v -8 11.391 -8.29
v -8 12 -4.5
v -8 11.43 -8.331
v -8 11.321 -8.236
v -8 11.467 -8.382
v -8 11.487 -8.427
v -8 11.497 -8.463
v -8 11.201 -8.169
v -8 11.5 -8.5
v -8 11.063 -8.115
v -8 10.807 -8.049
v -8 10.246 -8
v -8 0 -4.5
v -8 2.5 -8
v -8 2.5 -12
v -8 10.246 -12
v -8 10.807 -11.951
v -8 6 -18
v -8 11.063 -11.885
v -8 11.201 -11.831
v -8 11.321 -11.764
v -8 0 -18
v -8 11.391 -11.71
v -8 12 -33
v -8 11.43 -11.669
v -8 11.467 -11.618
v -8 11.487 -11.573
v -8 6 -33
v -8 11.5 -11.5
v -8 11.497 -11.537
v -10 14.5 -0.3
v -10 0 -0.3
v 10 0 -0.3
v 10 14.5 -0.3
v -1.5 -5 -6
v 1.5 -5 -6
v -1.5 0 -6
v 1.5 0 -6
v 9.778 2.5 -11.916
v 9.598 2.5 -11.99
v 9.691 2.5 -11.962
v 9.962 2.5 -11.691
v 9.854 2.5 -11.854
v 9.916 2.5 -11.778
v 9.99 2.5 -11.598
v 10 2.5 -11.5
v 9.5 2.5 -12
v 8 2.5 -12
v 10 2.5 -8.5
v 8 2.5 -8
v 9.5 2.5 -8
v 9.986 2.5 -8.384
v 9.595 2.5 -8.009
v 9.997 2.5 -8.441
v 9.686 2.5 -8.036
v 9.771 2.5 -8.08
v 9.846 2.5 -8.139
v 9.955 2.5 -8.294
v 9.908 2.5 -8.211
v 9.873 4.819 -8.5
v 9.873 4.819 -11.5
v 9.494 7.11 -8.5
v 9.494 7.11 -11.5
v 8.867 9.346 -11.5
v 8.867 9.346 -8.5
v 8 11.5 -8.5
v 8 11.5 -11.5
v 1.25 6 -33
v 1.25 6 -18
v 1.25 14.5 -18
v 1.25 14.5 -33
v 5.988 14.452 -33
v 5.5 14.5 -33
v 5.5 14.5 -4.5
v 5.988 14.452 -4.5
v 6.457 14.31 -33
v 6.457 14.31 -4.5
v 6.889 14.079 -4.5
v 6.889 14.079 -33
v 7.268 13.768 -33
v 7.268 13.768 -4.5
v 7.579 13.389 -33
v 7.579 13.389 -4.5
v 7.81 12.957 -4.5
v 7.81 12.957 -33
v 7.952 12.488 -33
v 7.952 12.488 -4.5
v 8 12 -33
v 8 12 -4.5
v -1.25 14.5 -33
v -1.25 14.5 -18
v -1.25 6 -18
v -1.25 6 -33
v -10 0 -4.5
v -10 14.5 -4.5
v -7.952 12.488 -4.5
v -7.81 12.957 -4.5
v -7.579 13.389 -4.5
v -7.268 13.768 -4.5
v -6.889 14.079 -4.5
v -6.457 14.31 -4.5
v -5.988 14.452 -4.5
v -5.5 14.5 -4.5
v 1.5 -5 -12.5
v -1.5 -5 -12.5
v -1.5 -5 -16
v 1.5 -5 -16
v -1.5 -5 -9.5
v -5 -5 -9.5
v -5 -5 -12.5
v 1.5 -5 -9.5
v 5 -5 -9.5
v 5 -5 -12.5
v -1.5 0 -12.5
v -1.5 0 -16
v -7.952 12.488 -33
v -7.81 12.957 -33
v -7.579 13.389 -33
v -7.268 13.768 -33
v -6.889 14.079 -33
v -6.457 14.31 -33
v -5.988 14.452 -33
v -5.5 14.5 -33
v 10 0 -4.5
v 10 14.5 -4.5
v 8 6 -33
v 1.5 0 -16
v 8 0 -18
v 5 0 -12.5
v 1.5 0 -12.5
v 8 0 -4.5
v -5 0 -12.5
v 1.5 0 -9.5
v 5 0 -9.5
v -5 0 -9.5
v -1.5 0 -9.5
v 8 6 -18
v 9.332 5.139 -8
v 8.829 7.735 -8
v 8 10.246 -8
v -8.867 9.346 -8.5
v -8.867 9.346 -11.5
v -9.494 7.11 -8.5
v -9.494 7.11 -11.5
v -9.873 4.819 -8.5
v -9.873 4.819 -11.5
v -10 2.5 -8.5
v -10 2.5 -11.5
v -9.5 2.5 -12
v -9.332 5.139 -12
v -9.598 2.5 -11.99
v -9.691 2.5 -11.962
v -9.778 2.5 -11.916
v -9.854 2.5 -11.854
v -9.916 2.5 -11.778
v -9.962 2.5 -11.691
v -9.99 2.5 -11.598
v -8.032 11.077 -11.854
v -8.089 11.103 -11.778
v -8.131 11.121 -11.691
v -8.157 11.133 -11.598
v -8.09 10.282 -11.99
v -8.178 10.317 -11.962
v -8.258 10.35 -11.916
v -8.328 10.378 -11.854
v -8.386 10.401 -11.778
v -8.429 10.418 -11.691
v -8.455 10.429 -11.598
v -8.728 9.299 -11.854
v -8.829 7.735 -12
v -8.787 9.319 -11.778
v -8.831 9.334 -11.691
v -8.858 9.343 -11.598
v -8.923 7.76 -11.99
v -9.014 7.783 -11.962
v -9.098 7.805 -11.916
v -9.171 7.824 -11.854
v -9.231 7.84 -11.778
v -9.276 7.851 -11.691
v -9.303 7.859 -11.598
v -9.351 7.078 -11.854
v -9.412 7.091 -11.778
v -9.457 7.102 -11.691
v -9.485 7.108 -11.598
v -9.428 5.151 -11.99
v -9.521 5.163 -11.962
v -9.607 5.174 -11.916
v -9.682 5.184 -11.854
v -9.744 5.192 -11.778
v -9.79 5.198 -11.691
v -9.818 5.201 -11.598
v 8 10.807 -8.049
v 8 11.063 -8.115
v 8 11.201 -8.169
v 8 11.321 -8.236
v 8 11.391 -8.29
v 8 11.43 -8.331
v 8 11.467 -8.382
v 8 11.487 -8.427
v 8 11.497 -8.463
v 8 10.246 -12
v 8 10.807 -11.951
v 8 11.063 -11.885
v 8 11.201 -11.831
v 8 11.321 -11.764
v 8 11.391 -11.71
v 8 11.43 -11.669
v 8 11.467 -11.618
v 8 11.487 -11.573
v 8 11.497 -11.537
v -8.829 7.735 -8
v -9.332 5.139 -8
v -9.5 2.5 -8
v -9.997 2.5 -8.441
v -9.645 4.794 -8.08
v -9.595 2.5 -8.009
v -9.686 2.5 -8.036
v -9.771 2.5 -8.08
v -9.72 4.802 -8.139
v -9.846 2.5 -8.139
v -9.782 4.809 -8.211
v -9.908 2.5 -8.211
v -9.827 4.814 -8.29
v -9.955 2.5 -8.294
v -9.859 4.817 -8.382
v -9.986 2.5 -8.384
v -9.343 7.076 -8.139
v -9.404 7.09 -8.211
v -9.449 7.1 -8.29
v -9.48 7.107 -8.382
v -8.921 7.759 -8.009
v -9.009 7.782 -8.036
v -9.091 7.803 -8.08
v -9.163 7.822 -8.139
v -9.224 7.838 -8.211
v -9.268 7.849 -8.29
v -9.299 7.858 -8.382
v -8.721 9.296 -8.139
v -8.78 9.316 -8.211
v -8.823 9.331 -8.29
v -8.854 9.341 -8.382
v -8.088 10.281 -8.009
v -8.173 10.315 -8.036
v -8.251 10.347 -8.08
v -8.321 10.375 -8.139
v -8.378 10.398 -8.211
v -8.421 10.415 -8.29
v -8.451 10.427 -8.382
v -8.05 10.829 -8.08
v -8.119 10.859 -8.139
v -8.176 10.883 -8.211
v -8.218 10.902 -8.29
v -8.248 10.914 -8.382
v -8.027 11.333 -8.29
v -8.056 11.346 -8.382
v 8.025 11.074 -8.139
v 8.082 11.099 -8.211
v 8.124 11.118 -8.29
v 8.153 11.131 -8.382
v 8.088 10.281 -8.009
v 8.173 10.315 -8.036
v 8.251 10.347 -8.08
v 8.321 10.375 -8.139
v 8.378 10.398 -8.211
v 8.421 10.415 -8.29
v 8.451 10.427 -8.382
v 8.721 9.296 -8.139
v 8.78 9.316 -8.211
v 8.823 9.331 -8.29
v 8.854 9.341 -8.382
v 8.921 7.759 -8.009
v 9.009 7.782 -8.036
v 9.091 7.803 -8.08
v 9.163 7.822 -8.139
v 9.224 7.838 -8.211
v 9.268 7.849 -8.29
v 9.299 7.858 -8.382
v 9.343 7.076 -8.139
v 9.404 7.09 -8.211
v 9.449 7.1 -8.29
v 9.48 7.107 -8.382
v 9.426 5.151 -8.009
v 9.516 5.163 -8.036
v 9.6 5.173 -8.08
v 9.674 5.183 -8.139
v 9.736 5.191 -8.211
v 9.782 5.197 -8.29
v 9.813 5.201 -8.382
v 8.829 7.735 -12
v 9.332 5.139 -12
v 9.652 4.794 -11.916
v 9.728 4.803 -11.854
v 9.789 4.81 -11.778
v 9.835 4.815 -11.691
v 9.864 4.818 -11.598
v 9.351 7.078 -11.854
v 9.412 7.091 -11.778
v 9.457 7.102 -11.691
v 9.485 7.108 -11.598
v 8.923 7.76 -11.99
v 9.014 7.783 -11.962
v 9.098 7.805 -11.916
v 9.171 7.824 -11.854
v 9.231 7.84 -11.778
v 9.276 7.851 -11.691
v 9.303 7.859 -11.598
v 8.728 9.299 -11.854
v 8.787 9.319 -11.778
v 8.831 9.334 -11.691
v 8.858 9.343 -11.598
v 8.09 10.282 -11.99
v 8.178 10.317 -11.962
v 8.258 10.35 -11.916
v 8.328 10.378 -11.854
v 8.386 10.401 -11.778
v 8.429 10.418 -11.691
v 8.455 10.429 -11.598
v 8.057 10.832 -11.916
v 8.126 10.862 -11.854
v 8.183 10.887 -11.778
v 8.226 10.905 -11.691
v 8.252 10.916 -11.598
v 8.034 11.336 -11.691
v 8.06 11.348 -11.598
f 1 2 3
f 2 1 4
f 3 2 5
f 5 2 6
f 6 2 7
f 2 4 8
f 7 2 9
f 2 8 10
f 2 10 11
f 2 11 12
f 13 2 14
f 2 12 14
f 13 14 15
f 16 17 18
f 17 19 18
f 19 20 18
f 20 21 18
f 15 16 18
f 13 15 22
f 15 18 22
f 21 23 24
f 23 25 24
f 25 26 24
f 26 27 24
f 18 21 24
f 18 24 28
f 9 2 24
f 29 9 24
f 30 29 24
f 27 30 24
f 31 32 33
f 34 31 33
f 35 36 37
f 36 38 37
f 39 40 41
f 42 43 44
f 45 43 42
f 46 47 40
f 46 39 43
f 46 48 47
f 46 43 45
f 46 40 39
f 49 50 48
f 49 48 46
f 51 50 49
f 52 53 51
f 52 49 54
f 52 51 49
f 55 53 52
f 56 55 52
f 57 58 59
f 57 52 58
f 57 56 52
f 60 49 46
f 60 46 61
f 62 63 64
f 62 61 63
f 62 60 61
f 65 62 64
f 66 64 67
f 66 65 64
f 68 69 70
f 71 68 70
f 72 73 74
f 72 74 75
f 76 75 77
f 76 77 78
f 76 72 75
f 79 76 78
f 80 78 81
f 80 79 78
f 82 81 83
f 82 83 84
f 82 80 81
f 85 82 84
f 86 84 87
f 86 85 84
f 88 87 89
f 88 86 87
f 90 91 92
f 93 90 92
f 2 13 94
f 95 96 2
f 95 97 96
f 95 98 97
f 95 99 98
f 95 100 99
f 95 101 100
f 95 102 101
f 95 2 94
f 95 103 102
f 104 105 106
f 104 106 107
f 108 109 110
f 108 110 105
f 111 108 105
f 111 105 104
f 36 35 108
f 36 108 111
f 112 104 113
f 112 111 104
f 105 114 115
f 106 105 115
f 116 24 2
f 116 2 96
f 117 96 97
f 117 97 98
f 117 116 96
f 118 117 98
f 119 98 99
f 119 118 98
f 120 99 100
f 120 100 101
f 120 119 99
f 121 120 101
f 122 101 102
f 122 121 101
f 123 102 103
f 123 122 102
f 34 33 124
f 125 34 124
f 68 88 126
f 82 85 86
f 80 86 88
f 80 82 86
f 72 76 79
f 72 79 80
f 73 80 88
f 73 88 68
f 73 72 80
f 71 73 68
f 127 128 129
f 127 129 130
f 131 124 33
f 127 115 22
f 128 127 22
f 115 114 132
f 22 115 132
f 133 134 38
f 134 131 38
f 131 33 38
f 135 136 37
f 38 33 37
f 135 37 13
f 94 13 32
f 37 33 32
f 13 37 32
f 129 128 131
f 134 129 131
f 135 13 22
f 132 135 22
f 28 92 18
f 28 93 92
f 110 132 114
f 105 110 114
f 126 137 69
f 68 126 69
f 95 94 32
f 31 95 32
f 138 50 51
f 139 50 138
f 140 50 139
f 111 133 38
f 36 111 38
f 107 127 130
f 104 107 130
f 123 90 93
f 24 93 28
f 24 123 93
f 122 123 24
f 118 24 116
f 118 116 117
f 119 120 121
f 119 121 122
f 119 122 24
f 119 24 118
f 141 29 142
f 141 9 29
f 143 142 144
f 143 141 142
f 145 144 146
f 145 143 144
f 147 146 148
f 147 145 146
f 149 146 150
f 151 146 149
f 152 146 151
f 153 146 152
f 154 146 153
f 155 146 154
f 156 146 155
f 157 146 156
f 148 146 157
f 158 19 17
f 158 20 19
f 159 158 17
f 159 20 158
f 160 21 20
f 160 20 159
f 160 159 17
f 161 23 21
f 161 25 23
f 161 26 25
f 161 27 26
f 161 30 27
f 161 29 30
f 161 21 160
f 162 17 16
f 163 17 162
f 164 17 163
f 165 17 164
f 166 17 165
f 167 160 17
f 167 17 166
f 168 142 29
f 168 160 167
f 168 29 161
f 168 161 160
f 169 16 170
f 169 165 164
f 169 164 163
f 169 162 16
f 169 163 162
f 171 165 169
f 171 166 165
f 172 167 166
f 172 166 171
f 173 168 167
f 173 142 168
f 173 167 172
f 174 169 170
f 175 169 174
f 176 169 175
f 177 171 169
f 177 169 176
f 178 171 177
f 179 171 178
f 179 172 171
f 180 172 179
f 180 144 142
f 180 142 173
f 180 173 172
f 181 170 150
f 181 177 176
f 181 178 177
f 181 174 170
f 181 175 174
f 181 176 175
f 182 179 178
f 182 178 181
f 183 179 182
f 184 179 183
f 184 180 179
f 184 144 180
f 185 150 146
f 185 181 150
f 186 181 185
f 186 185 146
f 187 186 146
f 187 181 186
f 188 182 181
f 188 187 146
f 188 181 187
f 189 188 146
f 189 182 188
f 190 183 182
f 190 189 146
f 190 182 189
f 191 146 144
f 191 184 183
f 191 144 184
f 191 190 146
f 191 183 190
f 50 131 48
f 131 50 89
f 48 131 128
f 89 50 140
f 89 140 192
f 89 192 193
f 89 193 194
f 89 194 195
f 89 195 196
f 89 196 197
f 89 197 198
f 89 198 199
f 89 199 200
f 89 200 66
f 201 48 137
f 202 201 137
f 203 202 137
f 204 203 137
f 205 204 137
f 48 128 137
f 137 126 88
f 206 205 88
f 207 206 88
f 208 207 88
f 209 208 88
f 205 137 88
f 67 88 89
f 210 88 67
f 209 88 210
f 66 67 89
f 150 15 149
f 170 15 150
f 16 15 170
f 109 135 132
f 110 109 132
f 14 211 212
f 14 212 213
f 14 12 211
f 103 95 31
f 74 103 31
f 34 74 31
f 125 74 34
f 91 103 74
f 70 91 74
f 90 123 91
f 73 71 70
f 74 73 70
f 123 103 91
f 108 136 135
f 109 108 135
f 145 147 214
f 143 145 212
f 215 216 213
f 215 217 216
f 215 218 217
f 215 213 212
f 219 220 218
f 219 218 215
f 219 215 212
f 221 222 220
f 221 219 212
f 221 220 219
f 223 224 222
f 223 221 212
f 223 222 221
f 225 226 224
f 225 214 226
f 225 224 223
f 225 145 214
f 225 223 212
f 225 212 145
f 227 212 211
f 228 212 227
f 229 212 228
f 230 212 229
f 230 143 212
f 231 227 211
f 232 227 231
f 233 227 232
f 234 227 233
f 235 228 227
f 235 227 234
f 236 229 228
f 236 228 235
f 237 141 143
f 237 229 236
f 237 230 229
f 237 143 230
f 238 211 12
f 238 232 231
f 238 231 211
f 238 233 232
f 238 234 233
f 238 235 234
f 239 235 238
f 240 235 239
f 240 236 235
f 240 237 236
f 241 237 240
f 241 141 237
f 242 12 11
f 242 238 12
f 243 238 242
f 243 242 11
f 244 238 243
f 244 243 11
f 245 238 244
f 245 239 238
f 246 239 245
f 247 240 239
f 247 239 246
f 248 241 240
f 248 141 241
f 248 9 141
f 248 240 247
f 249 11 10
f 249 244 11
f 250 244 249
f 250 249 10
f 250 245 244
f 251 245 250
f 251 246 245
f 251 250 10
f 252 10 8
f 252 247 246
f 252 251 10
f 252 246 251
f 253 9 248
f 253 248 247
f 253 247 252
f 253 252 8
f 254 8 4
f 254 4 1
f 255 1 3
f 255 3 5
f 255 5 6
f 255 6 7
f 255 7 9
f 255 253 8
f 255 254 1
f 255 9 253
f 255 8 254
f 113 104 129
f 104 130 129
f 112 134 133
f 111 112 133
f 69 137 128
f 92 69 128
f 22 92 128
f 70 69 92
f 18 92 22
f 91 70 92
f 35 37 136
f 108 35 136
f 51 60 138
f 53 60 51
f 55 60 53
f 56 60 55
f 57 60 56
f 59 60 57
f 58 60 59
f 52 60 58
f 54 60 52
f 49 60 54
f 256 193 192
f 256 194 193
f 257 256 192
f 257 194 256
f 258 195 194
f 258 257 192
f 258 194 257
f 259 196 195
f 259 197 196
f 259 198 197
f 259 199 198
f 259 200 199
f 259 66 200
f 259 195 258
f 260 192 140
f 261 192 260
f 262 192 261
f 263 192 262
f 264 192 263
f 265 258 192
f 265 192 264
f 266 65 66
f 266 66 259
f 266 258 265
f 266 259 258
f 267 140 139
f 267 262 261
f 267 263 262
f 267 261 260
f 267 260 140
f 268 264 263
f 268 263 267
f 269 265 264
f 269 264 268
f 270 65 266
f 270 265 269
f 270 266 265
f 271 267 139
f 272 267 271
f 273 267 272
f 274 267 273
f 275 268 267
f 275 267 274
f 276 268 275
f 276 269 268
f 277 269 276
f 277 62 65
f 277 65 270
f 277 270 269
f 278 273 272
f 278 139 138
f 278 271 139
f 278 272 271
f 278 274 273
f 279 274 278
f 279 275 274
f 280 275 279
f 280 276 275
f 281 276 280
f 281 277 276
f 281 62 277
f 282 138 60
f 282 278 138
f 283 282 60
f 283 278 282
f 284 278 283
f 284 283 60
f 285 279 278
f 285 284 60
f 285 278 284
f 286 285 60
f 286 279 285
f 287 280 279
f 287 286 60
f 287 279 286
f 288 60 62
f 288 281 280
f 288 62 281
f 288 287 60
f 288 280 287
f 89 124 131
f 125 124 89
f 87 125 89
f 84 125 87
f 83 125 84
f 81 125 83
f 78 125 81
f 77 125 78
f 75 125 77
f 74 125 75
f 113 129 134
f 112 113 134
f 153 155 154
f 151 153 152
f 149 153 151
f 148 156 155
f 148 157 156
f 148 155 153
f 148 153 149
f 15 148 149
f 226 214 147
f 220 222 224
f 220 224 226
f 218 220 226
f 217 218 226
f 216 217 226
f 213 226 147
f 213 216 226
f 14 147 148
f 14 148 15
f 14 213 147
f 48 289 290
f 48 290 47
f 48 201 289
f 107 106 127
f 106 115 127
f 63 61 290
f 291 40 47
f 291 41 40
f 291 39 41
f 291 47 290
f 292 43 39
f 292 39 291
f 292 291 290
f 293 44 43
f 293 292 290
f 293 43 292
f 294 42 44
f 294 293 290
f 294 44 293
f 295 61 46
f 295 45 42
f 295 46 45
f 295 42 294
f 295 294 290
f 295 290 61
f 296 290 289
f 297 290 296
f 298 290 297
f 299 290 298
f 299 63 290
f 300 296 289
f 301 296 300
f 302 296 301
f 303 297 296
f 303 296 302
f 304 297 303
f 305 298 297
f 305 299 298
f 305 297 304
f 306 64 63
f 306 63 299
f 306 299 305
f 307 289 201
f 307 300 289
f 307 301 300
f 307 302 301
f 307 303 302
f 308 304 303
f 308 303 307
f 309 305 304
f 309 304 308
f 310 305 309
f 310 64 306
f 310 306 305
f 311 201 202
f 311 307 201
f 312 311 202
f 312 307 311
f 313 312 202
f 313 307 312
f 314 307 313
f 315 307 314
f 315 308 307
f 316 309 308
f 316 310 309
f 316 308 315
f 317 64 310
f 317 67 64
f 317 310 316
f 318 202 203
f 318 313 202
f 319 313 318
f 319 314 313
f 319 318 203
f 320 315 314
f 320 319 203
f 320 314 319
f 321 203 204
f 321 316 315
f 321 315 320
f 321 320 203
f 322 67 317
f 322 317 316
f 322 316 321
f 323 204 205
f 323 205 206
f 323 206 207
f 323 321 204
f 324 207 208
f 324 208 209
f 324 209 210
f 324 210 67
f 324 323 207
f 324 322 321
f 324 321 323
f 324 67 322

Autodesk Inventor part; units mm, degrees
ref_plane "YZ Plane" through (0, 0, 0) normal (1, 0, 0) x (0, 1, 0)
ref_plane "XZ Plane" through (0, 0, 0) normal (0, 1, 0) x (-1, 0, 0)
ref_plane "XY Plane" through (0, 0, 0) normal (0, 0, 1) x (1, 0, 0)
sketch "スケッチ1" plane through (0, 0, 0) normal (0, 1, 0) x (-1, 0, 0)
  line L0 (10, -0.3) -> (0, -0.3)
  line L1 (0, -0.3) -> (0, -5)
  line L2 (0, -5) -> (10, -5)
  line L3 (10, -5) -> (10, -0.3)
  line L4 (8.5, -5) -> (0, -5)
  line L5 (0, -5) -> (0, -18)
  line L6 (0, -18) -> (8.5, -18)
  line L7 (8.5, -18) -> (8.5, -5)
  line L8 (10, -18) -> (0, -18)
  line L9 (0, -18) -> (0, -22.7)
  line L10 (0, -22.7) -> (10, -22.7)
  line L11 (10, -22.7) -> (10, -18)
  point P0 (0, 0)
  dimension "d0" = 10
  dimension "d2" = 1.5
  dimension "d3" = 13
  dimension "d34" = 5
  dimension "d35" = 0.3
extrude "押し出し1" add sketch "スケッチ1" along normal blind 15
sketch "スケッチ3" plane through (-10, 0, -18) normal (0, 0, 1) x (1, 0, 0)
  line L0 (0, 0) -> (1.5, 0) projected
  line L1 (1.5, 0) -> (1.5, 15) projected
  line L2 (0, 15) -> (1.5, 15) projected
  line L3 (0, 0) -> (0, 15) projected
  line L4 (0, 0) -> (10, 0) projected
  line L5 (10, 0) -> (10, 15) projected
  line L6 (0, 15) -> (10, 15) projected
  line L7 (0, 0) -> (0, 15) projected
  circle A0 centre (4.5, 12) radius 3
  circle A1 centre (4.5, 12) radius 2.5
  line L8 (2, 12) -> (2, 0)
  line L9 (4.5, 14.5) -> (10, 14.5)
  point P0 (1.5, 15)
  point P1 (1.5, 0)
  dimension "d6" = 6
  dimension "d7" = 0.5
extrude "押し出し2" cut sketch "スケッチ3" along normal up to surface (13 mm away) contours L1 A0 L8 L4 | L1 L6 A0 | A0 L9 A1 L8 | L6 L5 L9 A0 picked at (5.4334, 14.5914)
sketch "スケッチ4" plane through (0, 15, 0) normal (0, 1, 0) x (1, 0, 0)
  line L0 (0, 5) -> (-10, 5) projected
  line L1 (-10, 5) -> (-10, 0.3) projected
  line L2 (-10, 0.3) -> (0, 0.3) projected
  line L3 (0, 0.3) -> (0, 5) projected
  point P0 (0, 0)
extrude "押し出し3" cut sketch "スケッチ4" against normal up to surface (0.5 mm away)
sketch "スケッチ5" plane through (-8, 0, -18) normal (-1, 0, 0) x (0, 0, 1)
  line L0 (13, 0) -> (18, 0) projected
  line L1 (13, 0) -> (3, 0)
  line L2 (3, 0) -> (3, 15)
  line L3 (3, 15) -> (13, 15)
  line L4 (13, 15) -> (13, 0)
  line L5 (6, 12) -> (10, 12)
  line L6 (10, 12) -> (10, 2)
  line L7 (10, 2) -> (6, 2)
  line L8 (6, 2) -> (6, 12)
  line L9 (13, 0) -> (0, 0) projected
  point P0 (6.5, 0)
  point P1 (8, 12)
  point P2 (8, 15)
  dimension "d12" = 10
  dimension "d13" = 3
  dimension "d14" = 2
  dimension "d15" = 4
  dimension "d21" = 15
extrude "押し出し4" add sketch "スケッチ5" along normal blind 2 contours L5 L6 L7 L8
sketch "スケッチ6" plane through (-8, 2, -8) normal (0, 0, 1) x (1, 0, 0)
  line L0 (0, 10) -> (0, 0) projected
  line L1 (0, 10) -> (-2, 10) projected
  line L2 (-2, 0) -> (-2, 10) projected
  line L3 (0, 0) -> (-2, 0) projected
  line L4 (0, 0) -> (0, 10) projected
  arc A0 (0, 9.5) -> (-2, 0.5) centre (19.25, 0.5) ccw
  line L5 (-2, 0.5) -> (0, 0.5)
  point P0 (8, -2)
  point P1 (0, 0.5)
  dimension "d22" = 0.5
  dimension "d23" = 0.5
extrude "押し出し5" cut sketch "スケッチ6" against normal up to surface (4 mm away) contours L0 A0 L2 L1 | L0 L3 L2 L5
fillet "フィレット1" radius 0.5 2 edges at (-9.494, 7.1098, -12) (-9.494, 7.1098, -8)
mirror "ミラー1" about plane through (0, 0, -0.3) normal (1, 0, 0)
sketch "スケッチ7" plane through (-5.5, 14.5, -5) normal (0, 0, -1) x (-1, 0, 0)
  line L0 (4.5, 0) -> (0, 0) projected
  arc A0 (2.5, -2.5) -> (0, 0) centre (0, -2.5) ccw projected
  line L1 (2.5, -14.5) -> (2.5, -2.5) projected
  line L2 (4.5, -14.5) -> (2.5, -14.5) projected
  line L3 (4.5, -14.5) -> (4.5, 0) projected
  line L4 (-15.5, 0) -> (-11, 0) projected
  line L5 (-15.5, -14.5) -> (-15.5, 0) projected
  line L6 (-15.5, -14.5) -> (-13.5, -14.5) projected
  line L7 (-13.5, -14.5) -> (-13.5, -2.5) projected
  arc A1 (-11, 0) -> (-13.5, -2.5) centre (-11, -2.5) ccw projected
  point P0 (-5.5, -14.5)
extrude "押し出し6" cut sketch "スケッチ7" against normal blind 0.5
sketch "スケッチ13" plane through (-10, 14.5, -0.3) normal (0, 1, 0) x (1, 0, 0)
  arc A0 (21.586, 79.673) -> (5.1529, 40) centre (157.8276, 0) ccw projected
  arc A1 (46.2266, 111.6009) -> (0, 0) centre (157.8276, 0) ccw projected
  line L0 (0, 22.4) -> (0, 32.4) projected
  line L1 (0, 22.4) -> (0, 22.4) projected
  line L2 (0, 17.7) -> (0, 22.4) projected
  line L3 (0, 17.7) -> (2, 17.7) projected
  line L4 (0, 32.4) -> (20, 32.4) projected
  point P0 (10, -0.3)
  point P1 (0.9956, 17.7)
  point P2 (3.3615, 32.4)
extrude "押し出し14" cut sketch "スケッチ13" along normal through all both and the other way through all
mirror "ミラー2" about plane through (0, 0, 0) normal (1, 0, 0) of "押し出し14"
sketch "スケッチ14" plane through (0, 0, 0) normal (0, -1, 0) x (1, 0, 0)
  line L0 (1.5, -6) -> (-1.5, -6)
  line L1 (-1.5, -6) -> (-1.5, -16)
  line L2 (-1.5, -16) -> (1.5, -16)
  line L3 (1.5, -16) -> (1.5, -6)
  line L4 (5, -9.5) -> (-5, -9.5)
  line L5 (-5, -9.5) -> (-5, -12.5)
  line L6 (-5, -12.5) -> (5, -12.5)
  line L7 (5, -12.5) -> (5, -9.5)
  point P0 (0, 0)
  point P1 (5, -11)
  point P2 (1.5, -11)
  point P3 (0, -6)
  point P4 (0, -9.5)
  point P5 (1.5, -9.5)
  point P6 (-1.5, -9.5)
  point P7 (-1.5, -12.5)
  point P8 (1.5, -12.5)
  dimension "d65" = 10
  dimension "d66" = 3
  dimension "d70" = 6
extrude "押し出し15" add sketch "スケッチ14" along normal blind 5
sketch "スケッチ15" plane through (0, 0, 0) normal (0, -1, 0) x (1, 0, 0)
  arc A0 (-9.0044, -18) -> (-8.4023, -22.7) centre (147.8276, -0.3) ccw projected
  line L0 (-9.0044, -18) -> (9.0044, -18)
  line L1 (9.0044, -18) -> (9.0044, -22.7)
  line L2 (9.0044, -22.7) -> (-9.0044, -22.7)
  line L3 (-9.0044, -22.7) -> (-9.0044, -18)
  point P0 (0, 0)
  point P1 (8.4023, -22.7)
extrude "押し出し16" cut sketch "スケッチ15" against normal through all
sketch "スケッチ16" plane through (5.5, 14.5, -18) normal (0, 0, -1) x (-1, 0, 0)
  line L0 (13.5, -14.5) -> (13.5, -2.5) projected
  arc A0 (13.5, -2.5) -> (11, 0) centre (11, -2.5) ccw projected
  line L1 (11, 0) -> (0, 0) projected
  arc A1 (0, 0) -> (-2.5, -2.5) centre (0, -2.5) ccw projected
  line L2 (-2.5, -14.5) -> (-2.5, -2.5) projected
  line L3 (13.5, -14.5) -> (-2.5, -14.5) projected
  line L4 (6.75, -14.5) -> (4.25, -14.5)
  line L5 (4.25, -14.5) -> (4.25, 0)
  line L6 (4.25, 0) -> (6.75, 0)
  line L7 (6.75, 0) -> (6.75, -14.5)
  point P0 (5.5, -14.5)
  point P1 (5.5, -14.5)
  point P2 (6.75, 0)
  dimension "d73" = 2.5
extrude "押し出し17" add sketch "スケッチ16" along normal blind 15 contours L3 L7 L1 A0 L0 | L3 L2 A1 L1 L5
sketch "スケッチ17" plane through (5.5, 14.5, -33) normal (0, 0, -1) x (-1, 0, 0)
  line L0 (13.5, -14.5) -> (-2.5, -14.5)
  line L1 (-2.5, -14.5) -> (-2.5, -8.5)
  line L2 (-2.5, -8.5) -> (13.5, -8.5)
  line L3 (13.5, -8.5) -> (13.5, -14.5)
  line L4 (-2.5, -2.5) -> (-2.5, -14.5) projected
  point P0 (5.5, -14.5)
  dimension "d76" = 6
extrude "押し出し18" cut sketch "スケッチ17" against normal blind 15
equation "\"d22\" = d23"
properties part number "connector_male"
